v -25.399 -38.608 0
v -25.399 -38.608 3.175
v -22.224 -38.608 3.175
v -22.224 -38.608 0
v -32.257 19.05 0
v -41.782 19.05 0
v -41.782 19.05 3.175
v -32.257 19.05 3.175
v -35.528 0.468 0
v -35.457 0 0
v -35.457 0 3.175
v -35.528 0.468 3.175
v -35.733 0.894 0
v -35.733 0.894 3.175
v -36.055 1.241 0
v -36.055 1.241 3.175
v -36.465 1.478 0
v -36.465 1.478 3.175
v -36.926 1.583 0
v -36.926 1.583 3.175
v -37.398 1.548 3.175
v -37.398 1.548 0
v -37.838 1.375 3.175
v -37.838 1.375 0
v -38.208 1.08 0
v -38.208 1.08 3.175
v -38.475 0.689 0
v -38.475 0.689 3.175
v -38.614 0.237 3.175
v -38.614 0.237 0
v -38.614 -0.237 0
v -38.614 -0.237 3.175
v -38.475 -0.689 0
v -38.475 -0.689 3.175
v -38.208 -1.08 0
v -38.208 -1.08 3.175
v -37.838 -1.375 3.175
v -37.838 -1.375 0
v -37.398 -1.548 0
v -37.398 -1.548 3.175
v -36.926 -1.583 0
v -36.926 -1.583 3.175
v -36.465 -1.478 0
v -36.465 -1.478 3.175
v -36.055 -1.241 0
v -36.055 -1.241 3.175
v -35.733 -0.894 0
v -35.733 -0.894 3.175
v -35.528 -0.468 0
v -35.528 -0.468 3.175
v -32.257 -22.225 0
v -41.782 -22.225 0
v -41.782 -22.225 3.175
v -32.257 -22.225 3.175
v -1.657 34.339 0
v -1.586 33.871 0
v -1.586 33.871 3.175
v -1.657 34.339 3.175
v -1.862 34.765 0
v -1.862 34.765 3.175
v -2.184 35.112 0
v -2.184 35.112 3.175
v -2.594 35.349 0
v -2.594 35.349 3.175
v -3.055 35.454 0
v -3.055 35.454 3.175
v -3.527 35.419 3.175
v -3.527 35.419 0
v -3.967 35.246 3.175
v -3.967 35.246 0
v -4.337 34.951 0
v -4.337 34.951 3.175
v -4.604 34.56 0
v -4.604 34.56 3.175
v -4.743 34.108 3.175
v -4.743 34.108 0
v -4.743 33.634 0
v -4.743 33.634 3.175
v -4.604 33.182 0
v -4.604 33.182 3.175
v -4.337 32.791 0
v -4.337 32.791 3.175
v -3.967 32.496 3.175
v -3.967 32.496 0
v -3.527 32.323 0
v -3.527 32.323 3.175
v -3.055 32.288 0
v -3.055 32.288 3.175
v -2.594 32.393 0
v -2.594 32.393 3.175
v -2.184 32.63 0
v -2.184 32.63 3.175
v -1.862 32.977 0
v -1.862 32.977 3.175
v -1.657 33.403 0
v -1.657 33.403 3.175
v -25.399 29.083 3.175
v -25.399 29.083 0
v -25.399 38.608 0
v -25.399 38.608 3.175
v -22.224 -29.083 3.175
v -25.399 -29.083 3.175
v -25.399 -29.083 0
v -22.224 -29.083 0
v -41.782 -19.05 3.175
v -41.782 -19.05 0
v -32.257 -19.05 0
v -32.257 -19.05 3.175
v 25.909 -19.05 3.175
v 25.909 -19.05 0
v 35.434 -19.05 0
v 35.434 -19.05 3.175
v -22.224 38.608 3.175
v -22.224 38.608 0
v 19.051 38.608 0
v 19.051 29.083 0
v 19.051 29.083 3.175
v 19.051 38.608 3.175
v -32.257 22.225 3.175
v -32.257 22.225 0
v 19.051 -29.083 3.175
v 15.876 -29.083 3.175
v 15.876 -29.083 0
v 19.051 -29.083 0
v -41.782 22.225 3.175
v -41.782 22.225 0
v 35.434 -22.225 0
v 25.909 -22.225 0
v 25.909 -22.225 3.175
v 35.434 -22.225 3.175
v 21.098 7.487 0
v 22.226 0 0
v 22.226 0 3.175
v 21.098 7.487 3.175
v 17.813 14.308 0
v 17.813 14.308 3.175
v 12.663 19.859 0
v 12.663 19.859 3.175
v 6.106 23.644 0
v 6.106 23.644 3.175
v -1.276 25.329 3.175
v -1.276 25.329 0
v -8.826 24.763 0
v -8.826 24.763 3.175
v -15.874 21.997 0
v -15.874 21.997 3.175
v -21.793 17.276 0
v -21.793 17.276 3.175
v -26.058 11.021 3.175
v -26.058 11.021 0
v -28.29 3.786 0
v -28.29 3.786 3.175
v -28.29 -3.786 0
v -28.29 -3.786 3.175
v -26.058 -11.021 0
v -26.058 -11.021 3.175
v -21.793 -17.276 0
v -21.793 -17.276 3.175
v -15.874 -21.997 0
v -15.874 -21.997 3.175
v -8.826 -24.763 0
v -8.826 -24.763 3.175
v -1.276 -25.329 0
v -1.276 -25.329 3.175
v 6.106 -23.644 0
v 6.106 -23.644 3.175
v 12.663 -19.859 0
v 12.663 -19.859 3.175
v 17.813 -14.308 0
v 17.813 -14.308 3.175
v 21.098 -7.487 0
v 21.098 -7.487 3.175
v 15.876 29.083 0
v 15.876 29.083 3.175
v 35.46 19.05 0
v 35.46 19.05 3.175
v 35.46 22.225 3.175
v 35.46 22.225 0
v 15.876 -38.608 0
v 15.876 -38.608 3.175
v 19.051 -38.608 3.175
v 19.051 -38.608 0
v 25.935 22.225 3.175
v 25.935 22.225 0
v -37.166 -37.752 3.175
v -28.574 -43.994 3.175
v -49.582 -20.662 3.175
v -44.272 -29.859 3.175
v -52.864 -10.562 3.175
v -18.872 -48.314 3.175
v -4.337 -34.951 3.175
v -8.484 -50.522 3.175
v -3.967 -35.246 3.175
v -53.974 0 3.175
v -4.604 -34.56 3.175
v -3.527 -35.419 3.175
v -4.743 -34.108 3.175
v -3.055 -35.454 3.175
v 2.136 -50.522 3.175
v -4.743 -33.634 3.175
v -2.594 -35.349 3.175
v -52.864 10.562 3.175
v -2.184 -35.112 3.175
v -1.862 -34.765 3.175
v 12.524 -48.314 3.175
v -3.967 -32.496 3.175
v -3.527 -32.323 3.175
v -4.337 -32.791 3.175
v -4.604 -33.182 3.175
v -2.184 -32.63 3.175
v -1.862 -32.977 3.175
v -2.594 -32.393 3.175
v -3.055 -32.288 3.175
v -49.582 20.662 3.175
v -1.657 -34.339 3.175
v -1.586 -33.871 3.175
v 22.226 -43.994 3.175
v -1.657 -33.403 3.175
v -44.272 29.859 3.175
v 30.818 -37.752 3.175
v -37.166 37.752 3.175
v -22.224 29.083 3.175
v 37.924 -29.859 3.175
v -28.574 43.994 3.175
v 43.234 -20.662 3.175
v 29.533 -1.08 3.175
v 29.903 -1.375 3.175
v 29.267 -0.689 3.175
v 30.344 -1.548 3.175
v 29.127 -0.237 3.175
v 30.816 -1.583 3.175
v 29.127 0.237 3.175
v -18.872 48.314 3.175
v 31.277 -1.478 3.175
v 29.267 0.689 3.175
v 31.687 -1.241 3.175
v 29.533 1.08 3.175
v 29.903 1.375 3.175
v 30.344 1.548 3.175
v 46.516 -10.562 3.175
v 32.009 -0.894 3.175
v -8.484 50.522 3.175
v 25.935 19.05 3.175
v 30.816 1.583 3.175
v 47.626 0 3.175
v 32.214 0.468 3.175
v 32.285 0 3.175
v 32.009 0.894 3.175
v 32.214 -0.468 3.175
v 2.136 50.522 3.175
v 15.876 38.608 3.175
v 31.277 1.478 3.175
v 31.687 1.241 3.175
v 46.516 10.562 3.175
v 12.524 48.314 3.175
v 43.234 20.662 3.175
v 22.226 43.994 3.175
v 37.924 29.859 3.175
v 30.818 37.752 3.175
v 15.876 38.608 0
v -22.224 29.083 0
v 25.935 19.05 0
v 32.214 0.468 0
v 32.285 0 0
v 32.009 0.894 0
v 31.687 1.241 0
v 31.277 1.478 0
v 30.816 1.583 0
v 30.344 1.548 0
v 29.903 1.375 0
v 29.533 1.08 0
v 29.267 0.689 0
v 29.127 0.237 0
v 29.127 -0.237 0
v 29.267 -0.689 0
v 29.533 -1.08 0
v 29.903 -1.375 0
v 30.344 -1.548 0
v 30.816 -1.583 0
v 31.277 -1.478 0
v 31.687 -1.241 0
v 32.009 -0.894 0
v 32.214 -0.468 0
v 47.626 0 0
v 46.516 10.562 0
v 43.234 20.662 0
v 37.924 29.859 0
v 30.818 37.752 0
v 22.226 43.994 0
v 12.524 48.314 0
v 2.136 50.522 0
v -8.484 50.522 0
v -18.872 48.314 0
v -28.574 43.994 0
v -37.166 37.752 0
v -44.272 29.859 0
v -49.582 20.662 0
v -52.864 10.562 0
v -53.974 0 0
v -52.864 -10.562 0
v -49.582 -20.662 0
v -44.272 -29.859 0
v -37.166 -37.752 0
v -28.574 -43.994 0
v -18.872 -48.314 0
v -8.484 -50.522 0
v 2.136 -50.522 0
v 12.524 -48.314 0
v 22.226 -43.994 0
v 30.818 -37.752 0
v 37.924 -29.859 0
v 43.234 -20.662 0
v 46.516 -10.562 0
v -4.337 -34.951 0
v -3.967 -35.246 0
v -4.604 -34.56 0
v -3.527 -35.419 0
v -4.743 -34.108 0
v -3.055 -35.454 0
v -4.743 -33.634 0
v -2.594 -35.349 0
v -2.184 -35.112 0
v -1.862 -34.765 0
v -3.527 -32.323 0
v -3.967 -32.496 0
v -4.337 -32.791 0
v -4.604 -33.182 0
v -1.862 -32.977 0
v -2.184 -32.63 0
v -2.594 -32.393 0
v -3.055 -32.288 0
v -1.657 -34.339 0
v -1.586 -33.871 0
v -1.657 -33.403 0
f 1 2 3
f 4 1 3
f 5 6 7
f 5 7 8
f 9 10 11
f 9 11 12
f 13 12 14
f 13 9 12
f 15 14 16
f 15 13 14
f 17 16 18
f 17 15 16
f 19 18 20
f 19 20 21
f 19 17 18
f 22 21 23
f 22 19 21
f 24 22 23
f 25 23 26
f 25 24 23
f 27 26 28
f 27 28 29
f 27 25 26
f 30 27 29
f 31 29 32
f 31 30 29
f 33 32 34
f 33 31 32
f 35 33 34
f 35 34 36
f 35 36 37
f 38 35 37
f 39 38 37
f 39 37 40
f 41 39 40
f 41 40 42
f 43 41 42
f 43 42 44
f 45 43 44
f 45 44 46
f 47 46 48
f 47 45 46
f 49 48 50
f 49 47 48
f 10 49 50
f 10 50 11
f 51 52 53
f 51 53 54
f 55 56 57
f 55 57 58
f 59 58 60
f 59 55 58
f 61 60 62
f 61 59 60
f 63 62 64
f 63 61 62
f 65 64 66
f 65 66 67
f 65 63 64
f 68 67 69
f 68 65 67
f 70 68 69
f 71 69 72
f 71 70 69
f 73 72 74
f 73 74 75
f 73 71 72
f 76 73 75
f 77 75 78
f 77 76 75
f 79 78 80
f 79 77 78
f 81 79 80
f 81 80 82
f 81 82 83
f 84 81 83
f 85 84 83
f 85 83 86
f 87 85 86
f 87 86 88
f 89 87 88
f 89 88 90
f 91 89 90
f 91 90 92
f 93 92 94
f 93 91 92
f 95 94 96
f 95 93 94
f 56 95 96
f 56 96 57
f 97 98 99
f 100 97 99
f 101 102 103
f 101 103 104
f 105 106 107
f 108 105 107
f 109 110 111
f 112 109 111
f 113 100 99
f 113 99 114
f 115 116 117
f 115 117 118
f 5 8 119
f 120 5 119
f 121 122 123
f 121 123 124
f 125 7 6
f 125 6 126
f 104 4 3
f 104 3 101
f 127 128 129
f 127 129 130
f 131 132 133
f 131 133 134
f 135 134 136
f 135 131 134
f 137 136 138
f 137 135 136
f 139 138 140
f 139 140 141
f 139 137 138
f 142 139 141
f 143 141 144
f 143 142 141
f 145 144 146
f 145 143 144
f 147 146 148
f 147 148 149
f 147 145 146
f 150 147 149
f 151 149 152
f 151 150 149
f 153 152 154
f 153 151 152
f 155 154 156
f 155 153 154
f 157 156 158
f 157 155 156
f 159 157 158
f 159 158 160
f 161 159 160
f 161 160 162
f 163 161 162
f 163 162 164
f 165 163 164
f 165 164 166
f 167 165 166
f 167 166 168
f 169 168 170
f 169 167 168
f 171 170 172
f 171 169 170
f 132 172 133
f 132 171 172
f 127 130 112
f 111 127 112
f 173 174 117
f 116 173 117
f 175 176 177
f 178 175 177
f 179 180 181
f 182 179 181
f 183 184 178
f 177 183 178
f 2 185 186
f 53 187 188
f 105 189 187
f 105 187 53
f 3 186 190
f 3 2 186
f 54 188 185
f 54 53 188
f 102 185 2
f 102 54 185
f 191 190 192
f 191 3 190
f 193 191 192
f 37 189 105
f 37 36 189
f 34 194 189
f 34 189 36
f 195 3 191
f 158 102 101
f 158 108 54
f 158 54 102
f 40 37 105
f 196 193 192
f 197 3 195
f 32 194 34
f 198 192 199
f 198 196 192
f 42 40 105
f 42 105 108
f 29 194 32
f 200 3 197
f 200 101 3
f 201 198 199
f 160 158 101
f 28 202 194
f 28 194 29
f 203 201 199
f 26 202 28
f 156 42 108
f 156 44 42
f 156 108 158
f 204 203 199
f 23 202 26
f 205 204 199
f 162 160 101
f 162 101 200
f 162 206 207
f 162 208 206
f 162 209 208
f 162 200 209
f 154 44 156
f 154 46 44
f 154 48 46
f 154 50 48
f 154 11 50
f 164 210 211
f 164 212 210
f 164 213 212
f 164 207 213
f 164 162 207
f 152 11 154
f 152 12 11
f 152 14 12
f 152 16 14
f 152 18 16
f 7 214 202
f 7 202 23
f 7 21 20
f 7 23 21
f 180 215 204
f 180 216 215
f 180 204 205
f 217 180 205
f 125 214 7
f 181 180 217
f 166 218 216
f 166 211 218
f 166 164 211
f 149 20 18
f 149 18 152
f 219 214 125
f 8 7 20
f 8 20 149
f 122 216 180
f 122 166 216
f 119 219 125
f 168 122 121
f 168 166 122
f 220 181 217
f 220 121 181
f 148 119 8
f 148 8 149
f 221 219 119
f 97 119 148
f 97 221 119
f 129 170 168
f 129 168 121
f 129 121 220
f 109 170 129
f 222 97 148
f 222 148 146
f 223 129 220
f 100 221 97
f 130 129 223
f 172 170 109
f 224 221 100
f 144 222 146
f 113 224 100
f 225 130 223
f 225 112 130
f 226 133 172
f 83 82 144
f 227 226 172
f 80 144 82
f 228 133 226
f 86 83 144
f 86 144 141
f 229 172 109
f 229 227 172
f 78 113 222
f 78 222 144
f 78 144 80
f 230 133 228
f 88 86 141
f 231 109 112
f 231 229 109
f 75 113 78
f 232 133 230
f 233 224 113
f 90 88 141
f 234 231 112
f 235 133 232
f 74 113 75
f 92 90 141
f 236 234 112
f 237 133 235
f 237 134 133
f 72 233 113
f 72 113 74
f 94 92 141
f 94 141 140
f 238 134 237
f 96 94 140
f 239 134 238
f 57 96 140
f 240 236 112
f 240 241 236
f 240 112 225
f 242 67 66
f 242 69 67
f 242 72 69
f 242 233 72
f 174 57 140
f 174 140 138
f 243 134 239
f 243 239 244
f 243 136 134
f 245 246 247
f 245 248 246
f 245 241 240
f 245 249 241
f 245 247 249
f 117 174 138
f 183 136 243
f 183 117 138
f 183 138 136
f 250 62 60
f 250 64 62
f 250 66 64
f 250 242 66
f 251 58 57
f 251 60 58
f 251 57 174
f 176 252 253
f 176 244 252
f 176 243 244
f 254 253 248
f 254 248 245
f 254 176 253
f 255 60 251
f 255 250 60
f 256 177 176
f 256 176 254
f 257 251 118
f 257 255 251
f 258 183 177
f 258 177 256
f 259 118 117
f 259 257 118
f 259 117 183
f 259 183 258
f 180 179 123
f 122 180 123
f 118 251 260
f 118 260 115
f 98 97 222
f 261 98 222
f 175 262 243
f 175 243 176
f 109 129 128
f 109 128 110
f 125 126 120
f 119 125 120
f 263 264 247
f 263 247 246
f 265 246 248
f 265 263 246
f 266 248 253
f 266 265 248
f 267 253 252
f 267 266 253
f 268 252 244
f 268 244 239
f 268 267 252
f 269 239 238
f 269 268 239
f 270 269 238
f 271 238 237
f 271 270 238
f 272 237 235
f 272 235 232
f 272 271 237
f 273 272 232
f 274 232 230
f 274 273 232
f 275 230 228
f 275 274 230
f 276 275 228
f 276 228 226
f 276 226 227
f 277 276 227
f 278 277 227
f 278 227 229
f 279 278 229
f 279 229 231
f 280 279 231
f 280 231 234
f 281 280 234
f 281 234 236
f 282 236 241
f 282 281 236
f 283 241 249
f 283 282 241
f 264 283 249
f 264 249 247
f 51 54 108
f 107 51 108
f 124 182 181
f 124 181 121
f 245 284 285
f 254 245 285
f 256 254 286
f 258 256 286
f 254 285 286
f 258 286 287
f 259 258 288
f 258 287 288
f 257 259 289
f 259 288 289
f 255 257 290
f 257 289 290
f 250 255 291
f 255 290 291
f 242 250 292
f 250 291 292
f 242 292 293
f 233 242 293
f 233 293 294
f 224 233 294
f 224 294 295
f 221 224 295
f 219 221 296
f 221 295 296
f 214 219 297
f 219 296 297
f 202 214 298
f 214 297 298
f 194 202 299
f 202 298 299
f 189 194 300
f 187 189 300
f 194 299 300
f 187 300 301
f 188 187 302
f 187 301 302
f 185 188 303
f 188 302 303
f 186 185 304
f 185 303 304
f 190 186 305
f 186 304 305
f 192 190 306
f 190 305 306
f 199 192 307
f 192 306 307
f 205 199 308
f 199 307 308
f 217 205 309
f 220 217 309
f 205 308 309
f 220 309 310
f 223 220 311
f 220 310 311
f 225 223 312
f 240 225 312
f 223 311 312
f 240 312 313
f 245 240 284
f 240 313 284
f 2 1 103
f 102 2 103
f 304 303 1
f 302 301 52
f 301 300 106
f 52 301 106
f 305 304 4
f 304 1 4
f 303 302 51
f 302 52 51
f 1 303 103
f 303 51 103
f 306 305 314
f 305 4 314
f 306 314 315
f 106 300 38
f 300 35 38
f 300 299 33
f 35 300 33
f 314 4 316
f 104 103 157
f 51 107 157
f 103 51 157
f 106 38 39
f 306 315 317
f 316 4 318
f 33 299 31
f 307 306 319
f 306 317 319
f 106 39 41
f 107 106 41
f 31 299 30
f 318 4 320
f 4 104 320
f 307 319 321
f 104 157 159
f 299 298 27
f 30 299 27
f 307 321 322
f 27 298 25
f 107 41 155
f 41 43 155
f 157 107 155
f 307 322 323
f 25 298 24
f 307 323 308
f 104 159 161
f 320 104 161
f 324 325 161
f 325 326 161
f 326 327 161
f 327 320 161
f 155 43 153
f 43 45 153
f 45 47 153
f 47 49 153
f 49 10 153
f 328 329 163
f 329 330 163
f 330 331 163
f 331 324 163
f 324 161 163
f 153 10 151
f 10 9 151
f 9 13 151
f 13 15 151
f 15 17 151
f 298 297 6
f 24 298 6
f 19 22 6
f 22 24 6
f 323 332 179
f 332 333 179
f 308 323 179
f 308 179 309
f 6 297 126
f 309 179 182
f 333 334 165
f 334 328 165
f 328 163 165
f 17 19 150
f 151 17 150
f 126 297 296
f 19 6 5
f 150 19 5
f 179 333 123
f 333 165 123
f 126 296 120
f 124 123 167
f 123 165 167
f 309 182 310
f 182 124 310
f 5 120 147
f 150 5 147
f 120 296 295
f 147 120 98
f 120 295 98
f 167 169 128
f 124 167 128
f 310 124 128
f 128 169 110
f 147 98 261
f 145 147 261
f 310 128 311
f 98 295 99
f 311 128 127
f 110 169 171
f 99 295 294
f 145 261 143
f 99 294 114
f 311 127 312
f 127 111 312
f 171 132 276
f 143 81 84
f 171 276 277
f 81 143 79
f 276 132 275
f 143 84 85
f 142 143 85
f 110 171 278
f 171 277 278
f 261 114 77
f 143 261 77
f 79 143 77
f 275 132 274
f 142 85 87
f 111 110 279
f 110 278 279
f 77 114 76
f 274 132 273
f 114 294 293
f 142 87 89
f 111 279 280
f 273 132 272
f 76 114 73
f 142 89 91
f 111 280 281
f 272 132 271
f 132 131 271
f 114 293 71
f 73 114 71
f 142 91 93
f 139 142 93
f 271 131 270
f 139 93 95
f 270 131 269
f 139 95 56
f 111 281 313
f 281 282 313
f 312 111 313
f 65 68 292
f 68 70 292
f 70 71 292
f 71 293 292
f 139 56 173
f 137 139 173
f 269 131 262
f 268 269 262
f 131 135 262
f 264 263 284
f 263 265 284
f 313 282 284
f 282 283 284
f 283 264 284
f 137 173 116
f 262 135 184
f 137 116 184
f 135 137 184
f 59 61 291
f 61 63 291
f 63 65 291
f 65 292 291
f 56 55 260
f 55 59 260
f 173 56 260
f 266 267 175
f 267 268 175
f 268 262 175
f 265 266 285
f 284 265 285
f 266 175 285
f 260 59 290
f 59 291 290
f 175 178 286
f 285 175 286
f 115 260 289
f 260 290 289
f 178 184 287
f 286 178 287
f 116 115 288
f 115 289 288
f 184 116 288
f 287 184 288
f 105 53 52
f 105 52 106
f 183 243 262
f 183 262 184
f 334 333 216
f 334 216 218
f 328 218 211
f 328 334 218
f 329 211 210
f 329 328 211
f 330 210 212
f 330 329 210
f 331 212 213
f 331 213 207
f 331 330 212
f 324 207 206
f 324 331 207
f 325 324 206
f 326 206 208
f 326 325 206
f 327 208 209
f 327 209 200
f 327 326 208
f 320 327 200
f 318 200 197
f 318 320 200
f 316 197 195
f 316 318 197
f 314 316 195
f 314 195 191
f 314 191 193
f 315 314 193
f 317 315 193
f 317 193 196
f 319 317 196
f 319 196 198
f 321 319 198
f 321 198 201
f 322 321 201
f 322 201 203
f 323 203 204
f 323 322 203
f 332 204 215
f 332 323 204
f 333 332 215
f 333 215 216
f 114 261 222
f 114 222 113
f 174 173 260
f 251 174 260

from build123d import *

# Parameters (mm, degrees)
SKETCH1_R           = 50.8
SKETCH1_R_2         = 25.4
SKETCH1_R_3         = 1.5875
SKETCH1_W           = 9.525
SKETCH1_H           = 3.175
SKETCH1_W_2         = 3.175
SKETCH1_H_2         = 9.525
BOSS_EXTRUDE1_DEPTH = 3.175


with BuildPart() as part:
    # Sketch1 → Boss-Extrude1 (new body)
    with BuildSketch(Plane.XY):
        with Locations((-3.17373, 0)):
            Circle(SKETCH1_R)
        with Locations((-3.17373, 0)):
            Circle(SKETCH1_R_2, mode=Mode.SUBTRACT)
        with Locations((-3.17373, -33.8709)):
            Circle(SKETCH1_R_3, mode=Mode.SUBTRACT)
        with Locations((30.69717, 0)):
            Circle(SKETCH1_R_3, mode=Mode.SUBTRACT)
        with Locations((-37.04463, 0)):
            Circle(SKETCH1_R_3, mode=Mode.SUBTRACT)
        with Locations((-3.17373, 33.8709)):
            Circle(SKETCH1_R_3, mode=Mode.SUBTRACT)
        with Locations((-37.01923, -20.6375)):
            Rectangle(SKETCH1_W, SKETCH1_H, mode=Mode.SUBTRACT)
        with Locations((-37.01923, 20.6375)):
            Rectangle(SKETCH1_W, SKETCH1_H, mode=Mode.SUBTRACT)
        with Locations((-23.81123, 33.8455)):
            Rectangle(SKETCH1_W_2, SKETCH1_H_2, mode=Mode.SUBTRACT)
        with Locations((17.46377, 33.8455)):
            Rectangle(SKETCH1_W_2, SKETCH1_H_2, mode=Mode.SUBTRACT)
        with Locations((17.46377, -33.8455)):
            Rectangle(SKETCH1_W_2, SKETCH1_H_2, mode=Mode.SUBTRACT)
        with Locations((-23.81123, -33.8455)):
            Rectangle(SKETCH1_W_2, SKETCH1_H_2, mode=Mode.SUBTRACT)
        with Locations((30.67177, -20.6375)):
            Rectangle(SKETCH1_W, SKETCH1_H, mode=Mode.SUBTRACT)
        with Locations((30.69717, 20.6375)):
            Rectangle(SKETCH1_W, SKETCH1_H, mode=Mode.SUBTRACT)
    extrude(amount=BOSS_EXTRUDE1_DEPTH)


solid = part.part
